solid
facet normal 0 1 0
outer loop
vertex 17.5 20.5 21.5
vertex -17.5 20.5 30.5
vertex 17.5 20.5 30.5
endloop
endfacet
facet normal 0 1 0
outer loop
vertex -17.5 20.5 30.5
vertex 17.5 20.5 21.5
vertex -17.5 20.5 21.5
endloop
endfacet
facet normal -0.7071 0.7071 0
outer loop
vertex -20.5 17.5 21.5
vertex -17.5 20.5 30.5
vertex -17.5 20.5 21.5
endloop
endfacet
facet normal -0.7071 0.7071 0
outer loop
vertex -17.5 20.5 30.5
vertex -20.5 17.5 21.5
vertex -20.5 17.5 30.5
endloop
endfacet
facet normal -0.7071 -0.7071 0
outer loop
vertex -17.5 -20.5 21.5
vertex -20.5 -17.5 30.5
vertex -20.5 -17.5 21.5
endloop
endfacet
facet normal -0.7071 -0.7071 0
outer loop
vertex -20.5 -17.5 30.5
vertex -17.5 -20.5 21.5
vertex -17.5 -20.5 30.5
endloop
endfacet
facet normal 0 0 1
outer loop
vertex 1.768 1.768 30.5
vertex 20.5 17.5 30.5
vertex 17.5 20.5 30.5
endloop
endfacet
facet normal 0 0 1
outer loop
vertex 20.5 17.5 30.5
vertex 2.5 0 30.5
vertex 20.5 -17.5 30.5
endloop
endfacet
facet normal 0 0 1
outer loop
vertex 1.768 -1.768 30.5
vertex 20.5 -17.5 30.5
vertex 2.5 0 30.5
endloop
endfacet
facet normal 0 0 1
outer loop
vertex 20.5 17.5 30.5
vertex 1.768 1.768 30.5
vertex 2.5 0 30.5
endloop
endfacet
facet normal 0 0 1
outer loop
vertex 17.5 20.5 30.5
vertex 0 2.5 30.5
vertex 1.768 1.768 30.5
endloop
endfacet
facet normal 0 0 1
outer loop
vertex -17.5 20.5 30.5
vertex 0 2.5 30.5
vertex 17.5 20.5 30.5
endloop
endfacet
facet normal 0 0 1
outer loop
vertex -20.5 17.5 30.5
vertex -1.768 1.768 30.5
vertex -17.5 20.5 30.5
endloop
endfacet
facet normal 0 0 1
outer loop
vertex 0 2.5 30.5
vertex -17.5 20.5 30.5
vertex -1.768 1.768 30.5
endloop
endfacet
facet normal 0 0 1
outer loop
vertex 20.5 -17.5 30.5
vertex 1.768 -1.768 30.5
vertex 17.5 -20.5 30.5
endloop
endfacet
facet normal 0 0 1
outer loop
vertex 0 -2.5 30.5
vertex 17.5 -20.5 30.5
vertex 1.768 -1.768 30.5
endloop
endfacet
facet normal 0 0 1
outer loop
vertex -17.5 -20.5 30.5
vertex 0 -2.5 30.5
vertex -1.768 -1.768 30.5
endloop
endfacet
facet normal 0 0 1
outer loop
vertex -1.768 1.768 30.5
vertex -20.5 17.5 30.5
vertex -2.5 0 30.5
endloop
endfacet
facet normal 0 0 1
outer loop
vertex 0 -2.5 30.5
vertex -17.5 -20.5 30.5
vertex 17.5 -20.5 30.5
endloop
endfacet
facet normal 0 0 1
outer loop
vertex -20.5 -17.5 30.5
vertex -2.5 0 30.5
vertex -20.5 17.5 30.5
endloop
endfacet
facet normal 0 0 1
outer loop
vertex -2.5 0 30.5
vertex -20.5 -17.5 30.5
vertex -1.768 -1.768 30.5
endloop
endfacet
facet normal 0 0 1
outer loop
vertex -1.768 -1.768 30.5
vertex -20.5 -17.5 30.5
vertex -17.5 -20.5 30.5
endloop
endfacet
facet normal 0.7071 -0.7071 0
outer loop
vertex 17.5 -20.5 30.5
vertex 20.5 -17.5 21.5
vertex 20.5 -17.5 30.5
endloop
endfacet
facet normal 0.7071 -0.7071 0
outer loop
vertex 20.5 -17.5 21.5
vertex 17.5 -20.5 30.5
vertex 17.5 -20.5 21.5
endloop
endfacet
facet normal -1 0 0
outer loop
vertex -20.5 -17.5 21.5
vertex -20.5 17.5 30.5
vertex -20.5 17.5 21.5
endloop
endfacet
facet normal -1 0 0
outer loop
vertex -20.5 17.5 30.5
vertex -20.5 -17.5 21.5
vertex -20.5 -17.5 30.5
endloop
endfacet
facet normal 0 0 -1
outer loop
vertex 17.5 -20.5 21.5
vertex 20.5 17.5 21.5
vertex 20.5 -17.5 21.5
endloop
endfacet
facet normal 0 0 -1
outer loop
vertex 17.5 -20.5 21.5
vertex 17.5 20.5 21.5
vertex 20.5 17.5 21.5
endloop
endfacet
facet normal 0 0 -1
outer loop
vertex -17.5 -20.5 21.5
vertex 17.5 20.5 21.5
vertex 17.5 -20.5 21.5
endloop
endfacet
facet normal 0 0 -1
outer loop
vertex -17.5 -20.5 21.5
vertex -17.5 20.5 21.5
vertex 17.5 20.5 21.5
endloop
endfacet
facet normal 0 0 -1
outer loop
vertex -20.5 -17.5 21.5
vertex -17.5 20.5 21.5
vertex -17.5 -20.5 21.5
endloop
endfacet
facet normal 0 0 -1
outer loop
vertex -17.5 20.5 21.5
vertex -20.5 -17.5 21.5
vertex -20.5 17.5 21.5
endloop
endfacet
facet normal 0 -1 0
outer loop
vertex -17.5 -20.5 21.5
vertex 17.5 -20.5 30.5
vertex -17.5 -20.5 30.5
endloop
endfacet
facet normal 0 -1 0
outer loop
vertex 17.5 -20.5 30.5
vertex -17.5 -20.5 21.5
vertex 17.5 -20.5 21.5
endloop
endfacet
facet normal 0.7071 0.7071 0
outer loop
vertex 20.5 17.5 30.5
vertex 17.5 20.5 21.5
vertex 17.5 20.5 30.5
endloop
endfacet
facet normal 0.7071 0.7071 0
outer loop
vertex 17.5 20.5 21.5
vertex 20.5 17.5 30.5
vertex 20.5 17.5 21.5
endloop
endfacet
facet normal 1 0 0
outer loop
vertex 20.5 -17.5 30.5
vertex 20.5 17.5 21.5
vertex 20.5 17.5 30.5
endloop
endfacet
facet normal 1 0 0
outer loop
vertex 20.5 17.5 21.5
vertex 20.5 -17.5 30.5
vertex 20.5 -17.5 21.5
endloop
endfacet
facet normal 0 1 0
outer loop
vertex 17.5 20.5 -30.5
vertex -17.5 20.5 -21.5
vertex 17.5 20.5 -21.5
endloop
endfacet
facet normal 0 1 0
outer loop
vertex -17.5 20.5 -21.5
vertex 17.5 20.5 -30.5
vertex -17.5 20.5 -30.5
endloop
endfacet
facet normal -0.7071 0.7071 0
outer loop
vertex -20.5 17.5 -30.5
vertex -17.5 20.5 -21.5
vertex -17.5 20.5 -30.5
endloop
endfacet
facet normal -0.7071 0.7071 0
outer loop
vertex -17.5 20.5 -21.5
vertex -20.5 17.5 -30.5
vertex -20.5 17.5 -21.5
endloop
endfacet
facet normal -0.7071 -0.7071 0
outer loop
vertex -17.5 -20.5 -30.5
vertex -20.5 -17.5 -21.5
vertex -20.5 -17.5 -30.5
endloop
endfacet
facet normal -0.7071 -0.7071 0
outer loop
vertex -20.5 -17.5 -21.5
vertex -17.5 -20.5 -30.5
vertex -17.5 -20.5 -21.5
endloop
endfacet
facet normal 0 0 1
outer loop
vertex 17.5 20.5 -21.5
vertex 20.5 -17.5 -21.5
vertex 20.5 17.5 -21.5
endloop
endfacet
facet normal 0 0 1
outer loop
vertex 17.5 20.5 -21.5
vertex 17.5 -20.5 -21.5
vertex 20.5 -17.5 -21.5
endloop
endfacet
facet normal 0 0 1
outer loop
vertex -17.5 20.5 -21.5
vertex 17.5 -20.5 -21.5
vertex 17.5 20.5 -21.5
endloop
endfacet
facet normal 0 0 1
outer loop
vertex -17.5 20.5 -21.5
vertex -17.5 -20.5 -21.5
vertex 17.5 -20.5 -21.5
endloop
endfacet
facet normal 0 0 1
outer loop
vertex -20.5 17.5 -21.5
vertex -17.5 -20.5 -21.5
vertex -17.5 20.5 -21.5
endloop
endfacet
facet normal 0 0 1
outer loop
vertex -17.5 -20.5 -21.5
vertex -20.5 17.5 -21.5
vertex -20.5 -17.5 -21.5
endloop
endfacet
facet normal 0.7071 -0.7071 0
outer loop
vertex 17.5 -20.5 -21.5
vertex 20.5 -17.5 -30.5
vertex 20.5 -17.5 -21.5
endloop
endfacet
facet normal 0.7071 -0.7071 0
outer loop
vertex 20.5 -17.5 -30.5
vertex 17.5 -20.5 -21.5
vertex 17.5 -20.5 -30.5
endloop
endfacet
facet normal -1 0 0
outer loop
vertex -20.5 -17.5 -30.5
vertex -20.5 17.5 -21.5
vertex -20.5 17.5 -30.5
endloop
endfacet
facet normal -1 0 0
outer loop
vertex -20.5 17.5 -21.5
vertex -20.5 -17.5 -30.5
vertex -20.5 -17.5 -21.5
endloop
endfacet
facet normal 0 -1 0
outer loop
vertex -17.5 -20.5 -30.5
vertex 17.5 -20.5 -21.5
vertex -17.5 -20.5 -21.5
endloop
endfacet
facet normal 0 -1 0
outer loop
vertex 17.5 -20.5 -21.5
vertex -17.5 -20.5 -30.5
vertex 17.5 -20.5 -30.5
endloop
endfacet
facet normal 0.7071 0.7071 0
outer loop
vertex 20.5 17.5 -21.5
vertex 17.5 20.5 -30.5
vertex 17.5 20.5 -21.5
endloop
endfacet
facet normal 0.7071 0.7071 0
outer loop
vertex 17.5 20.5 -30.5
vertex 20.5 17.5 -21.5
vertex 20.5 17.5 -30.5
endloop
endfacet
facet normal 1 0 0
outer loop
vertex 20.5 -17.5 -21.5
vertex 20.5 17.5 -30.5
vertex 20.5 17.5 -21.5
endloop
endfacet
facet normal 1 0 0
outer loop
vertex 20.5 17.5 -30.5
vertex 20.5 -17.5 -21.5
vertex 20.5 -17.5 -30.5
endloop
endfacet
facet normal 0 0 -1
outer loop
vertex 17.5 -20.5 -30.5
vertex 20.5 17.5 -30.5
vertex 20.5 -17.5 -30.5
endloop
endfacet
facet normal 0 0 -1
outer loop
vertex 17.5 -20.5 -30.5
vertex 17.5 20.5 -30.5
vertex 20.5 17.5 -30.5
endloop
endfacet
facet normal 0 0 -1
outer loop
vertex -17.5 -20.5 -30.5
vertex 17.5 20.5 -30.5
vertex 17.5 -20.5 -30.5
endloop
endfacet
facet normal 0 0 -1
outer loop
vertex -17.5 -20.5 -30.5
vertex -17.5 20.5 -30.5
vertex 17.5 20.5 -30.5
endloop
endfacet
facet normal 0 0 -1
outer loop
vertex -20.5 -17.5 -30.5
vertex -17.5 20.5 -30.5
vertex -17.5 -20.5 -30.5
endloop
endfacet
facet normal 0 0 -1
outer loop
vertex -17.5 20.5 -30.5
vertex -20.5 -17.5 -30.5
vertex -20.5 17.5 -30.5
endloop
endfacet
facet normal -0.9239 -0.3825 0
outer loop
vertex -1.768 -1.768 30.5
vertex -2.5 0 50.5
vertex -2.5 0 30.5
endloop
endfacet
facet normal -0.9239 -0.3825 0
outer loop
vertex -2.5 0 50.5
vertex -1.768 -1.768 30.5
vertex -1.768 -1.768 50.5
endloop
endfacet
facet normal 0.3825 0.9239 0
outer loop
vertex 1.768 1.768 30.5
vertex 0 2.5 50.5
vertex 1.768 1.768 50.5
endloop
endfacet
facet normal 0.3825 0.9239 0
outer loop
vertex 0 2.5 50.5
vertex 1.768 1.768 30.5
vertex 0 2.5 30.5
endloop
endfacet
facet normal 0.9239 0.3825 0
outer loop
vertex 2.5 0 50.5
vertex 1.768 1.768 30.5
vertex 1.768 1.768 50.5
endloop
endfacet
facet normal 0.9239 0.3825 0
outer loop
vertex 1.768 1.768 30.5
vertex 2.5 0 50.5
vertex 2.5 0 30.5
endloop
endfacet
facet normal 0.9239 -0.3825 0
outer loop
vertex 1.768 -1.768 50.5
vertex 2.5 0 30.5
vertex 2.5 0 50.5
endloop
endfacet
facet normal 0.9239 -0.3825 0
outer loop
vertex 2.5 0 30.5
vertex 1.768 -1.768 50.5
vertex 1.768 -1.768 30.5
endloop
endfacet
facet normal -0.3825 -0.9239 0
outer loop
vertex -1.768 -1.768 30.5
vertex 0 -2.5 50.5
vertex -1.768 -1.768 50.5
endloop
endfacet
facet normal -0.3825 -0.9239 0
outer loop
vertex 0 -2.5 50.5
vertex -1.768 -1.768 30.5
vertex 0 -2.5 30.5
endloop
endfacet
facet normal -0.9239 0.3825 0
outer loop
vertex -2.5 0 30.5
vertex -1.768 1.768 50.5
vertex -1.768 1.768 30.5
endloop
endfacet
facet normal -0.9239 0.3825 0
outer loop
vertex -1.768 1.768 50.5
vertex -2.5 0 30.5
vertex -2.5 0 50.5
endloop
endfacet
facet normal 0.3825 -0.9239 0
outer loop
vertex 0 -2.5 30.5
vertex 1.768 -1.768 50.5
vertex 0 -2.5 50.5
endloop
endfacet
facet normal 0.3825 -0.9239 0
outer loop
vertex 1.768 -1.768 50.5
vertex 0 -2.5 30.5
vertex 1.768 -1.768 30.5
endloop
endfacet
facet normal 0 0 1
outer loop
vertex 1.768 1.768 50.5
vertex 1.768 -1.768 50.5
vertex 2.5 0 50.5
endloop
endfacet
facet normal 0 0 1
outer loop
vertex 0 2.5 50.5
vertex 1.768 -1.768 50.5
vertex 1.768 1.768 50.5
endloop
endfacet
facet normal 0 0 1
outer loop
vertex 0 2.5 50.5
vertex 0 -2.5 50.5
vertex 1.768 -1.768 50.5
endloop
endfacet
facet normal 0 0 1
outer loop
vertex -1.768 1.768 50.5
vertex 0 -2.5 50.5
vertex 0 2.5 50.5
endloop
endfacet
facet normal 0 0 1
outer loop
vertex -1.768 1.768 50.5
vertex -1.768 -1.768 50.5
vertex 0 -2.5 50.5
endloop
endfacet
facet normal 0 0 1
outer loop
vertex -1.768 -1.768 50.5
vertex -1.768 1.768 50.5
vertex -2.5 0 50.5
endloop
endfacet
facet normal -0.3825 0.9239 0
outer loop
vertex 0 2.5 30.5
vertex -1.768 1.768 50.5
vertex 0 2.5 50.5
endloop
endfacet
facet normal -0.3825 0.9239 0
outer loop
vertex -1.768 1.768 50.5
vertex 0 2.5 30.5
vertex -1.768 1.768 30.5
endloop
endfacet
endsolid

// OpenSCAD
union () {
  translate([0,0,26]) {
    hull() {
      cube(center=true, size=[41,35,9]);
      cube(center=true, size=[35,41,9]);
    }
  }
    
  translate([0,0,-26]) {
    hull() {
      cube(center=true, size=[41,35,9]);
      cube(center=true, size=[35,41,9]);
    }
  }
}

translate([0,0,30.5])
  cylinder(d=5, h=20, $ffn=6);
/*
hull() {
  cube(center=true, size=[41,28,43]);
  cube(center=true, size=[28,41,43]);
}*/
